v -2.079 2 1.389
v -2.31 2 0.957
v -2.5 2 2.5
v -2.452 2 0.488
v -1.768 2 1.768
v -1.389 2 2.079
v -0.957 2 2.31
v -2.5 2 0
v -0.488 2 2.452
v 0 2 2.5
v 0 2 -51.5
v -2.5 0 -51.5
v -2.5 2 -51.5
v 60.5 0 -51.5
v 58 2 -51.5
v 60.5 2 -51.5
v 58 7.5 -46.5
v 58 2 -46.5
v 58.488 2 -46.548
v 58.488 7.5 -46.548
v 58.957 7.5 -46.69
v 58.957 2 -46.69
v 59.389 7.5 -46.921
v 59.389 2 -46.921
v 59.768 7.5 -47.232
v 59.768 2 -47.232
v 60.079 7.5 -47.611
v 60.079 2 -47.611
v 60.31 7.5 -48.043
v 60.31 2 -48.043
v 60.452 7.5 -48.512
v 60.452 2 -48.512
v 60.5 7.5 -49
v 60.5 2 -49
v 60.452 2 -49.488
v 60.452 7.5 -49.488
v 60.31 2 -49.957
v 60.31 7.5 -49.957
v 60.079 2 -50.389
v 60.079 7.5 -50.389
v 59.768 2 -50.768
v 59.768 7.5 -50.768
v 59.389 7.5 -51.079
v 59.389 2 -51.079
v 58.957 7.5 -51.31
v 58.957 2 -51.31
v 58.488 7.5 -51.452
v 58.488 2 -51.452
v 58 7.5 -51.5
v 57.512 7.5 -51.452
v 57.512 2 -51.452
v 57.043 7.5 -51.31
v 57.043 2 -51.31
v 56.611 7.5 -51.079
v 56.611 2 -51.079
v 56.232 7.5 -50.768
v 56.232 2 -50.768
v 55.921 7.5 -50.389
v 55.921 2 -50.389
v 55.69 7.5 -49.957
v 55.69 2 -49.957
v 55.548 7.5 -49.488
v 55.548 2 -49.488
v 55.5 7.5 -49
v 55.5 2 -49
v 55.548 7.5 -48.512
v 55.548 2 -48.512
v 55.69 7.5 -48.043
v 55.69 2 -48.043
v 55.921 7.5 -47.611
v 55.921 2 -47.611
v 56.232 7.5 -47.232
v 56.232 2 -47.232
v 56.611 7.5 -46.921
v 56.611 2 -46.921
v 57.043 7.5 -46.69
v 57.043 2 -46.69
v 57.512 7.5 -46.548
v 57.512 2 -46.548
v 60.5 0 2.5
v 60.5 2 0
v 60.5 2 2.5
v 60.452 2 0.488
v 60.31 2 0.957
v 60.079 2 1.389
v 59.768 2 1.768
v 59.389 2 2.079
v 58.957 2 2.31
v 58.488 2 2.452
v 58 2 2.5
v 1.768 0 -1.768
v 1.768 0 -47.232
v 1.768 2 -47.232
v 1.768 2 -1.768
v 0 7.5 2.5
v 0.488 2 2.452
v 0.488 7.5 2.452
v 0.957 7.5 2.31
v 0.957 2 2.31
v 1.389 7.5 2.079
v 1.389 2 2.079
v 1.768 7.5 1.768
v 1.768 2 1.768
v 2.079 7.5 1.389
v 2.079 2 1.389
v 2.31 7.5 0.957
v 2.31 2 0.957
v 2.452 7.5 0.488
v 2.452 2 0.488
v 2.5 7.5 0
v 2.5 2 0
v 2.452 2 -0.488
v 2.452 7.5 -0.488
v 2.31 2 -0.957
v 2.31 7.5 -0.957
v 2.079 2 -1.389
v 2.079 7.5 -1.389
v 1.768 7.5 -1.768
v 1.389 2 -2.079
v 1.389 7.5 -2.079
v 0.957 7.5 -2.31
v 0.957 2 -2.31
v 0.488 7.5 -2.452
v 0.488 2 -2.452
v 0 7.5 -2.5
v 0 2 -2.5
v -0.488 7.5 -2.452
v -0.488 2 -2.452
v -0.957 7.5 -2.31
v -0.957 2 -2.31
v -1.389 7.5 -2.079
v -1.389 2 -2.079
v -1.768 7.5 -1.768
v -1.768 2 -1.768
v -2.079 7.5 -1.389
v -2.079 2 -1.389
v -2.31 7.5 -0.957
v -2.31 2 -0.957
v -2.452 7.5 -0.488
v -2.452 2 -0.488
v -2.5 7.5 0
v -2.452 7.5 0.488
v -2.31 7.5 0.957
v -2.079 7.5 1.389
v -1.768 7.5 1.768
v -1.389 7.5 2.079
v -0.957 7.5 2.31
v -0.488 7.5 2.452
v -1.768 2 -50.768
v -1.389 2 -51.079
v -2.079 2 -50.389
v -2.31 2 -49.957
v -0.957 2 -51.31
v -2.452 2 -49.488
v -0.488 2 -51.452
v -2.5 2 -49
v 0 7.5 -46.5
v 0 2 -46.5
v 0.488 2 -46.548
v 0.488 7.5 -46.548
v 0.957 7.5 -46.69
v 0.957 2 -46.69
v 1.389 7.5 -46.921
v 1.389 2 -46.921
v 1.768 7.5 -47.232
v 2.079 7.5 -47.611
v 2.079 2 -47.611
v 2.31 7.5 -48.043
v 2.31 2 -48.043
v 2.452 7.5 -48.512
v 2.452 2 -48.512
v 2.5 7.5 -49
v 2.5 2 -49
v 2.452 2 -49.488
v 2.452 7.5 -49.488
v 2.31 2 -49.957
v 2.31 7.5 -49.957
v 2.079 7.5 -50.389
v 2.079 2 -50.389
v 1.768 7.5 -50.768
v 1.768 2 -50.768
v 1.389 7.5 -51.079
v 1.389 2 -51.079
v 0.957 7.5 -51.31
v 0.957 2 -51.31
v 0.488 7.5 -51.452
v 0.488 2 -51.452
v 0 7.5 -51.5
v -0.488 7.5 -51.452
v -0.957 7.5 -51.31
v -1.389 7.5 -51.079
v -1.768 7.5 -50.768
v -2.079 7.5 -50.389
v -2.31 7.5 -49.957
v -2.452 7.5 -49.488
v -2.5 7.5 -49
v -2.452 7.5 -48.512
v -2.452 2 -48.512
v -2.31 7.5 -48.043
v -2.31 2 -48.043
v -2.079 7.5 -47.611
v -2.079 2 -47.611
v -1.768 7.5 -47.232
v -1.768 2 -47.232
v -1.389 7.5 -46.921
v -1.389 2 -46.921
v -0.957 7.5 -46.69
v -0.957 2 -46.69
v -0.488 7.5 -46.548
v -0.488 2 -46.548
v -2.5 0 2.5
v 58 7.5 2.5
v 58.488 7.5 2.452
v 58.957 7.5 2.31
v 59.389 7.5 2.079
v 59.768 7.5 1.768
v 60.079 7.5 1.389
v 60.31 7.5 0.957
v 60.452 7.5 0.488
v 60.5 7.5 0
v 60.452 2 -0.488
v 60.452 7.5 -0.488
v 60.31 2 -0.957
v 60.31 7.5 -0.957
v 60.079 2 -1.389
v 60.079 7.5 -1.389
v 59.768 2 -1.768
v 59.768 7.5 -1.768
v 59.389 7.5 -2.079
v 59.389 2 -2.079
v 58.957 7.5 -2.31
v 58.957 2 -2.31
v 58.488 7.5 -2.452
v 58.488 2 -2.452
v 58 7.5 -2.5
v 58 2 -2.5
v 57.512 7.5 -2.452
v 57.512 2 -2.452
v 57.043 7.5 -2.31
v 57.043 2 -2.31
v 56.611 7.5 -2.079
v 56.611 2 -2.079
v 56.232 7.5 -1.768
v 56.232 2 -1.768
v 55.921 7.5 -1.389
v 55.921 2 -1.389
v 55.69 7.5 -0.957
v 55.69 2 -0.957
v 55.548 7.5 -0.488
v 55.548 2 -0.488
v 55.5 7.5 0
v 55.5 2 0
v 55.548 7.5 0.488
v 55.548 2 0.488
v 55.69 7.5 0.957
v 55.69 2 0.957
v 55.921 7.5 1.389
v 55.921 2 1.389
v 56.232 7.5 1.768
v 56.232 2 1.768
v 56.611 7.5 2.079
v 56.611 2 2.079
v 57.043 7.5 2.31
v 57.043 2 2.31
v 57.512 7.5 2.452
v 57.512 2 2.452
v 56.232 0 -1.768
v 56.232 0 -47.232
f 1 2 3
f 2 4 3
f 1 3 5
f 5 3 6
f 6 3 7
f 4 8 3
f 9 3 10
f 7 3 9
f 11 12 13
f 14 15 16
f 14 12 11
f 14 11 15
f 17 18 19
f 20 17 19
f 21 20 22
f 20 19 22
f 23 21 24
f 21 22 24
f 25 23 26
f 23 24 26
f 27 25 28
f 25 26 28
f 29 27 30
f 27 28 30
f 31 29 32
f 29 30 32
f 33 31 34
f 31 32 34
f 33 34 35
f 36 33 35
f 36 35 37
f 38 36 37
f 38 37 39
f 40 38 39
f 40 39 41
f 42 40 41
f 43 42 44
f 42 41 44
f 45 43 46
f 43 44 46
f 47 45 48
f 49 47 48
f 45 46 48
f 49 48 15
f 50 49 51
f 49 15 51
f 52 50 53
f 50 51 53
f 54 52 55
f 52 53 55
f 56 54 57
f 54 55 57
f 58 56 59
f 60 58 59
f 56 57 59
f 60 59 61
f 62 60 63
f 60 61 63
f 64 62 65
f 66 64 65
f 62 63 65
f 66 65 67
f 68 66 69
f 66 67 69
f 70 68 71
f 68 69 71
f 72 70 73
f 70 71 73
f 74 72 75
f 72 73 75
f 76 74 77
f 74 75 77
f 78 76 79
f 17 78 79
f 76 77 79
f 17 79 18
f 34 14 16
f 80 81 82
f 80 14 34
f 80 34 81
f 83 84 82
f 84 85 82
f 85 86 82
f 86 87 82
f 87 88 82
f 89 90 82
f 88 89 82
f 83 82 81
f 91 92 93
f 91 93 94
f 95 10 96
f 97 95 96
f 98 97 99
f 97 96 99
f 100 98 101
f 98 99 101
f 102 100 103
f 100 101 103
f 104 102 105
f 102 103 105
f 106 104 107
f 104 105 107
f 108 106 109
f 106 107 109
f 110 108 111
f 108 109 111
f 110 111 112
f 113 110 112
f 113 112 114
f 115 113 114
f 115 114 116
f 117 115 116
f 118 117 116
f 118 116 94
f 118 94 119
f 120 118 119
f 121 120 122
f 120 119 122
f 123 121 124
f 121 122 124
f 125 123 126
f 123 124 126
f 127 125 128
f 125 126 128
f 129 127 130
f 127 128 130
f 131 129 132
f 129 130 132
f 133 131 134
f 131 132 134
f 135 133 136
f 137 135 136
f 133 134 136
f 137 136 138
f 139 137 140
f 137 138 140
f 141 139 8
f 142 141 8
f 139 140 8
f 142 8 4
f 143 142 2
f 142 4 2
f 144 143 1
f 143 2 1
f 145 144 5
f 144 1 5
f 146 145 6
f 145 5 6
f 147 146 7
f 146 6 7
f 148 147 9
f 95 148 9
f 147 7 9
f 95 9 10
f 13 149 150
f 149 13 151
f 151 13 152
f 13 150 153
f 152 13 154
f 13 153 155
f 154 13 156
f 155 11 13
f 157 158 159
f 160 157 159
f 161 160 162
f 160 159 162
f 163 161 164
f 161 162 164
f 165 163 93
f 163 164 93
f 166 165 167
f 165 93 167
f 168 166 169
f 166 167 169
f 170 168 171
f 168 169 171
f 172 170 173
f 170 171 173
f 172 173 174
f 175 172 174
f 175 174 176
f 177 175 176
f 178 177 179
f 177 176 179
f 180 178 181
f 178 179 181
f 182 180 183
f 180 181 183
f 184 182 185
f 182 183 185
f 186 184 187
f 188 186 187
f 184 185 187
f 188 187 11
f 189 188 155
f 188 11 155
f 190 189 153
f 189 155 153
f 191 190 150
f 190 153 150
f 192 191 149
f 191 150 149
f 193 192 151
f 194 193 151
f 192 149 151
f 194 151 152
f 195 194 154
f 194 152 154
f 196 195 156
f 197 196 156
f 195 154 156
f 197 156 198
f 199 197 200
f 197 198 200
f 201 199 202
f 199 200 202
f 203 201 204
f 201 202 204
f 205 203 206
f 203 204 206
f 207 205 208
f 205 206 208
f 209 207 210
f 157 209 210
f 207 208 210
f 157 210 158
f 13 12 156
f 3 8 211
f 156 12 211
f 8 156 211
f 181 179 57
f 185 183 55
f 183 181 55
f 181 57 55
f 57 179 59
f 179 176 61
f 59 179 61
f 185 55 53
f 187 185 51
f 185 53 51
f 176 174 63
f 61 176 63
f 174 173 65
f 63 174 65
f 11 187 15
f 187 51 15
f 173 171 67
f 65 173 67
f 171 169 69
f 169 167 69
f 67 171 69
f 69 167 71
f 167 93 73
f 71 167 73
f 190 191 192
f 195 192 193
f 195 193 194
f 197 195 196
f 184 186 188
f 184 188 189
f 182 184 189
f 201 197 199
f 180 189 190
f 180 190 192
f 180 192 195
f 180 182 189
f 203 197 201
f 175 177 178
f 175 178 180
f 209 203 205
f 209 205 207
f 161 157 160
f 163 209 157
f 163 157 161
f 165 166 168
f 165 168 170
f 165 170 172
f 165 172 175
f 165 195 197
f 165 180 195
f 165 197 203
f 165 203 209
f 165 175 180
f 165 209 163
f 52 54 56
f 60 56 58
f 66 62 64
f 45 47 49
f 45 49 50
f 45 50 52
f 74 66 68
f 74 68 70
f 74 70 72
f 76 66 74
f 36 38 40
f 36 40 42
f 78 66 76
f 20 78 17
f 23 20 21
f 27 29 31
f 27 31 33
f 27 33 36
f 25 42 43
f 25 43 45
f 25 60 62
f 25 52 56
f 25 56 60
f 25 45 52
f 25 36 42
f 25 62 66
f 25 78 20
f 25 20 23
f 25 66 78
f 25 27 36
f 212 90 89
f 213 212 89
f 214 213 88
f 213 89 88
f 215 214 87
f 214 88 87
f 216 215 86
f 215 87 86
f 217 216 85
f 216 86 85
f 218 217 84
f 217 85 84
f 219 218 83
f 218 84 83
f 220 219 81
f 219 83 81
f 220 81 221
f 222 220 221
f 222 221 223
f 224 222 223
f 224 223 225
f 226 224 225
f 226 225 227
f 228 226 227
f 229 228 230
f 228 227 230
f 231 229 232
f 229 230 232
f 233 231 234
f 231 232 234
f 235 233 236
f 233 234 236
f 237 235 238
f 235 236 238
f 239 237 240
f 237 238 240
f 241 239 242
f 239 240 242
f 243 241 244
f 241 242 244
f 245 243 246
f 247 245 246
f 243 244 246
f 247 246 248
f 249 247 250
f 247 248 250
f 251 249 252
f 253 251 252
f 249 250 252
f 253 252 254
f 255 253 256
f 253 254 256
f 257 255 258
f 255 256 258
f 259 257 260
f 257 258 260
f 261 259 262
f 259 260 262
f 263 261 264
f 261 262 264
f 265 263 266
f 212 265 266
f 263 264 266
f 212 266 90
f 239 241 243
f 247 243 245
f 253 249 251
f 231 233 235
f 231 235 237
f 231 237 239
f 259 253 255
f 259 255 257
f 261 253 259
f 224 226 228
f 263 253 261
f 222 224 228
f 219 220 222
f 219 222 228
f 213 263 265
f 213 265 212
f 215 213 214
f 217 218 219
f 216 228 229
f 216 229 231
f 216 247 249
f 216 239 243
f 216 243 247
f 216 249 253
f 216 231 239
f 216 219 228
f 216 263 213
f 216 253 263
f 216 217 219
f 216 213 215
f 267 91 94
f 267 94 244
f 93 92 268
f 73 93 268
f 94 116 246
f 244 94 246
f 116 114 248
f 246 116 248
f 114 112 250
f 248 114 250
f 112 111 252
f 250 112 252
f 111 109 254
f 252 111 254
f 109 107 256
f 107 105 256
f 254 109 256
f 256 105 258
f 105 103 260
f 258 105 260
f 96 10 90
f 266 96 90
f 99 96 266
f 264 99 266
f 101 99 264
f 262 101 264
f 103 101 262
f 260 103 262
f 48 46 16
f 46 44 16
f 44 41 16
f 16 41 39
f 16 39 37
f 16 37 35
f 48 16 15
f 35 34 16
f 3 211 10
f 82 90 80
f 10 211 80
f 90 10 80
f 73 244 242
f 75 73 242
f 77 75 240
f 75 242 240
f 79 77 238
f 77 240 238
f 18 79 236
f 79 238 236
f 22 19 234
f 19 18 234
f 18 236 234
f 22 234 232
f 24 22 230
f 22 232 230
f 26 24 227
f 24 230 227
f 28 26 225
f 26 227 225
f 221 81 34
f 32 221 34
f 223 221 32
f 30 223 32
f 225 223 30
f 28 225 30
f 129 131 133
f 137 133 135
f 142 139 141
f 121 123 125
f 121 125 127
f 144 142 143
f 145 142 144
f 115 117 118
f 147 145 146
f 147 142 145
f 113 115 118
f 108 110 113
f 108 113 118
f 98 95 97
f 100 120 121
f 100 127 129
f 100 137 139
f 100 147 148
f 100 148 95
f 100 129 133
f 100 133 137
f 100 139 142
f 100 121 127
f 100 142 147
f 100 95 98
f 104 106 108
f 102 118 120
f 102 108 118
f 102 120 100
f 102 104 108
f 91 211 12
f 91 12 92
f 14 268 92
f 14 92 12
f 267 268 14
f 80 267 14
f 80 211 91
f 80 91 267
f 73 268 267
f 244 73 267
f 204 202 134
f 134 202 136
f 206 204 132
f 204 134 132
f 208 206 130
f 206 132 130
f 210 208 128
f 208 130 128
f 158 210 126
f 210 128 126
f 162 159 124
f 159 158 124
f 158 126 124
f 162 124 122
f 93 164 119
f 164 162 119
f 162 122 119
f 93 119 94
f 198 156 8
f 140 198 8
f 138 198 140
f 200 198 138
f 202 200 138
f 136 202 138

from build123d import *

# Parameters (mm, degrees)
SKETCH4_R           = 2.5
SKETCH4_R_2         = 1.8415
BOSS_EXTRUDE4_DEPTH = 7.5
SKETCH5_W           = 63
SKETCH5_H           = 54
SKETCH5_W_2         = 54.464466094
SKETCH5_H_2         = 45.464466094
BOSS_EXTRUDE5_DEPTH = 2


with BuildPart() as part:
    # Sketch4 → Boss-Extrude4 (new body)
    # profile 1 of 8: a face of its own
    with BuildSketch(Plane(origin=(0, 0, 0), x_dir=(1, 0, 0), z_dir=(0, 1, 0))):
        with Locations(Location((58, 0, 0), (0, 0, 270))):
            Circle(SKETCH4_R)
        with Locations((58, 0)):
            Circle(SKETCH4_R_2, mode=Mode.SUBTRACT)
    # profile 2 of 8: a face of its own
    with BuildSketch(Plane(origin=(0, 0, 0), x_dir=(1, 0, 0), z_dir=(0, 1, 0))):
        with Locations((58, 0)):
            Circle(SKETCH4_R_2)
    # profile 3 of 8: a face of its own
    with BuildSketch(Plane(origin=(0, 0, 0), x_dir=(1, 0, 0), z_dir=(0, 1, 0))):
        with Locations(Location((0, 0, 0), (0, 0, 270))):
            Circle(SKETCH4_R)
        Circle(SKETCH4_R_2, mode=Mode.SUBTRACT)
    # profile 4 of 8: a face of its own
    with BuildSketch(Plane(origin=(0, 0, 0), x_dir=(1, 0, 0), z_dir=(0, 1, 0))):
        Circle(SKETCH4_R_2)
    # profile 5 of 8: a face of its own
    with BuildSketch(Plane(origin=(0, 0, 0), x_dir=(1, 0, 0), z_dir=(0, 1, 0))):
        with Locations(Location((0, 49, 0), (0, 0, 270))):
            Circle(SKETCH4_R)
        with Locations((0, 49)):
            Circle(SKETCH4_R_2, mode=Mode.SUBTRACT)
    # profile 6 of 8: a face of its own
    with BuildSketch(Plane(origin=(0, 0, 0), x_dir=(1, 0, 0), z_dir=(0, 1, 0))):
        with Locations((0, 49)):
            Circle(SKETCH4_R_2)
    # profile 7 of 8: a face of its own
    with BuildSketch(Plane(origin=(0, 0, 0), x_dir=(1, 0, 0), z_dir=(0, 1, 0))):
        with Locations(Location((58, 49, 0), (0, 0, 270))):
            Circle(SKETCH4_R)
        with Locations((58, 49)):
            Circle(SKETCH4_R_2, mode=Mode.SUBTRACT)
    # profile 8 of 8: a face of its own
    with BuildSketch(Plane(origin=(0, 0, 0), x_dir=(1, 0, 0), z_dir=(0, 1, 0))):
        with Locations((58, 49)):
            Circle(SKETCH4_R_2)
    extrude(amount=BOSS_EXTRUDE4_DEPTH)

    # Sketch5 → Boss-Extrude5 (add)
    with BuildSketch(Plane.XZ):
        with Locations((29, -24.5)):
            Rectangle(SKETCH5_W, SKETCH5_H)
        with Locations((29, -24.5)):
            Rectangle(SKETCH5_W_2, SKETCH5_H_2, mode=Mode.SUBTRACT)
    extrude(amount=-BOSS_EXTRUDE5_DEPTH)


solid = part.part
